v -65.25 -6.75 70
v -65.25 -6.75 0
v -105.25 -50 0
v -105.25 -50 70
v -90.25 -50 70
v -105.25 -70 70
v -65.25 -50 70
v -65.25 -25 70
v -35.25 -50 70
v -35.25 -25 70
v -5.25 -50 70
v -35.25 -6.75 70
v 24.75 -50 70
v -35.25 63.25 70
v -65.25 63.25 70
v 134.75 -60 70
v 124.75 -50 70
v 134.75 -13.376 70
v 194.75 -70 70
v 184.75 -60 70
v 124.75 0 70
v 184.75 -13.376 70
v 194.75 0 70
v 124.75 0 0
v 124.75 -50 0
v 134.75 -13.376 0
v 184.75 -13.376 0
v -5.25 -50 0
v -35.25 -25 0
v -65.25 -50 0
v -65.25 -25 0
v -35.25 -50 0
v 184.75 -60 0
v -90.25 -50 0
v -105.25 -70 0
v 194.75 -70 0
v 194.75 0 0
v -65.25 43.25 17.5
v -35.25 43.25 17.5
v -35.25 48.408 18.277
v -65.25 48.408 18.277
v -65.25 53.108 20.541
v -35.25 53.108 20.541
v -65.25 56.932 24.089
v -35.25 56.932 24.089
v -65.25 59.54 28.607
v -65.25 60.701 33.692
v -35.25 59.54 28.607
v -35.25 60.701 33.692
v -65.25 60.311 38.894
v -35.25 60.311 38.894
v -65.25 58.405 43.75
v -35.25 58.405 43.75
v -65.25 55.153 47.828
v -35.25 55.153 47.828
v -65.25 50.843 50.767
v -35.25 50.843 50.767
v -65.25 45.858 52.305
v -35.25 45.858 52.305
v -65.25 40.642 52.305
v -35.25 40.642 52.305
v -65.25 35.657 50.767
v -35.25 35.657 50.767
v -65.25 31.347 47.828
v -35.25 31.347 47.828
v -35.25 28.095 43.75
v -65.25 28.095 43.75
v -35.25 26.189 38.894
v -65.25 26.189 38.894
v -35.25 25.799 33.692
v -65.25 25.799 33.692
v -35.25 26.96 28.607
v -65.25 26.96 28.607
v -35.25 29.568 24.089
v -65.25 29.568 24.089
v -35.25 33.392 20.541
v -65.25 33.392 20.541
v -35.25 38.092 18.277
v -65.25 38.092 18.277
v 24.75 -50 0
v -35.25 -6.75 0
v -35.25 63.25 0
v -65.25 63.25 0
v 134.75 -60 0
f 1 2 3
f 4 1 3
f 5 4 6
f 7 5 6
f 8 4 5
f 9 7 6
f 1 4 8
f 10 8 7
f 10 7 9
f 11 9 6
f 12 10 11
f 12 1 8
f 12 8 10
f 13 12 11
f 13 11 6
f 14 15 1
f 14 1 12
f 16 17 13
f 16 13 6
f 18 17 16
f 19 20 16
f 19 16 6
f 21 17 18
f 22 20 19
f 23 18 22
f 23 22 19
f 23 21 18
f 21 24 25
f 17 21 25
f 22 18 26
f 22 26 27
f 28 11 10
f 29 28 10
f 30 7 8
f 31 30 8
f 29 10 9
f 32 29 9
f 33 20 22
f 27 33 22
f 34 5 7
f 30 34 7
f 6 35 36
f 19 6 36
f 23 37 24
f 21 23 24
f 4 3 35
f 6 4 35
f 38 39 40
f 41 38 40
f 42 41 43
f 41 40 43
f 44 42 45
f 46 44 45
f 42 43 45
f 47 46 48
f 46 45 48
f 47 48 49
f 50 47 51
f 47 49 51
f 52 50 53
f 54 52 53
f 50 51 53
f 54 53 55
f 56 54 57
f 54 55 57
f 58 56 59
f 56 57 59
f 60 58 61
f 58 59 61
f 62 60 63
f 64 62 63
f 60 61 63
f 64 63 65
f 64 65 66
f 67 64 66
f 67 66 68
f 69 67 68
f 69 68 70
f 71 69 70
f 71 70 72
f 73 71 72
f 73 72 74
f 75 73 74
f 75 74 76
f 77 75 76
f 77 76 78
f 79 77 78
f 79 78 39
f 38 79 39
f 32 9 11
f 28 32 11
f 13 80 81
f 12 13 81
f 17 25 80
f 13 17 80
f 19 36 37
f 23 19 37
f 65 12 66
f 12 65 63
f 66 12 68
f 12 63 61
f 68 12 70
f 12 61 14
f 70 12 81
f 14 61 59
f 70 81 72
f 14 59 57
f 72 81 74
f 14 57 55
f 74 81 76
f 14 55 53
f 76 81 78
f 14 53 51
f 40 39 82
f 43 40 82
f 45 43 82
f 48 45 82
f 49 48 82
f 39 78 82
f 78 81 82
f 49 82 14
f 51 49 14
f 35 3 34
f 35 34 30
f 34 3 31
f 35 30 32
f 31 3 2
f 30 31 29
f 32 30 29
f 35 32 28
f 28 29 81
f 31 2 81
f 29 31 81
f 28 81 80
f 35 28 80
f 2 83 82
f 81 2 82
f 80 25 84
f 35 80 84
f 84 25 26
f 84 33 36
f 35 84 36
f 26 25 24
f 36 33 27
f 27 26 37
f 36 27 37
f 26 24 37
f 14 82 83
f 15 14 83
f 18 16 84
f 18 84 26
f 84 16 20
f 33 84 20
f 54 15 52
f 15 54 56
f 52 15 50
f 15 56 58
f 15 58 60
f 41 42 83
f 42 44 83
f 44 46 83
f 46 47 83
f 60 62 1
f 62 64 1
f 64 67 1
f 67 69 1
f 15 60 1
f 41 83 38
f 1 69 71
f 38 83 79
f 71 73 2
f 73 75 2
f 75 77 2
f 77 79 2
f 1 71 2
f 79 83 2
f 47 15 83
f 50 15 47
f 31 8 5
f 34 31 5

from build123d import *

# Parameters (mm, degrees)
EXTRUDE_1_DEPTH     = 70
SKETCH_2_W          = 50
SKETCH_2_H          = 46.62381926
CUT_EXTRUDE_1_DEPTH = 70
CUT_EXTRUDE_2_REACH = 72
SKETCH_3_R          = 17.5
CUT_EXTRUDE_3_DEPTH = 70


with BuildPart() as part:
    # 草图1 → 凸台-拉伸1 (new body)
    with BuildSketch(Plane.XY):
        Polygon((-65.25, 63.25), (-65.25, -6.75), (-105.25, -50), (-105.25, -70), (194.75, -70), (194.75, 0), (124.75, 0), (124.75, -50), (24.75, -50), (-35.25, -6.75), (-35.25, 63.25), align=None)
    extrude(amount=EXTRUDE_1_DEPTH)

    # 草图2 → 切除-拉伸1 (cut)
    with BuildSketch(Plane.XY.offset(70)):
        with Locations((159.75, -36.68809037)):
            Rectangle(SKETCH_2_W, SKETCH_2_H)
    extrude(amount=-CUT_EXTRUDE_1_DEPTH, mode=Mode.SUBTRACT)

    # 草图3 → 切除-拉伸2 (cut, up to next)
    with BuildSketch(Plane(origin=(-35.25, 0, 0), x_dir=(0, 0, -1), z_dir=(1, 0, 0)), mode=Mode.PRIVATE) as cut_extrude_2_sk1:
        with Locations((-35, 43.25)):
            Circle(SKETCH_3_R)
    cut_extrude_2_tool1 = extrude(cut_extrude_2_sk1.sketch, amount=-CUT_EXTRUDE_2_REACH, mode=Mode.PRIVATE) & part.part
    add(cut_extrude_2_tool1.solids().sort_by_distance((-35.25, 43.25, 35))[0], mode=Mode.SUBTRACT)

    # 草图4 → 切除-拉伸3 (cut)
    with BuildSketch(Plane.XY.offset(70)):
        Polygon((-65.25, -25), (-90.25, -50), (-65.25, -50), align=None)
        Polygon((-35.25, -25), (-35.25, -50), (-5.25, -50), align=None)
    extrude(amount=-CUT_EXTRUDE_3_DEPTH, mode=Mode.SUBTRACT)


solid = part.part
